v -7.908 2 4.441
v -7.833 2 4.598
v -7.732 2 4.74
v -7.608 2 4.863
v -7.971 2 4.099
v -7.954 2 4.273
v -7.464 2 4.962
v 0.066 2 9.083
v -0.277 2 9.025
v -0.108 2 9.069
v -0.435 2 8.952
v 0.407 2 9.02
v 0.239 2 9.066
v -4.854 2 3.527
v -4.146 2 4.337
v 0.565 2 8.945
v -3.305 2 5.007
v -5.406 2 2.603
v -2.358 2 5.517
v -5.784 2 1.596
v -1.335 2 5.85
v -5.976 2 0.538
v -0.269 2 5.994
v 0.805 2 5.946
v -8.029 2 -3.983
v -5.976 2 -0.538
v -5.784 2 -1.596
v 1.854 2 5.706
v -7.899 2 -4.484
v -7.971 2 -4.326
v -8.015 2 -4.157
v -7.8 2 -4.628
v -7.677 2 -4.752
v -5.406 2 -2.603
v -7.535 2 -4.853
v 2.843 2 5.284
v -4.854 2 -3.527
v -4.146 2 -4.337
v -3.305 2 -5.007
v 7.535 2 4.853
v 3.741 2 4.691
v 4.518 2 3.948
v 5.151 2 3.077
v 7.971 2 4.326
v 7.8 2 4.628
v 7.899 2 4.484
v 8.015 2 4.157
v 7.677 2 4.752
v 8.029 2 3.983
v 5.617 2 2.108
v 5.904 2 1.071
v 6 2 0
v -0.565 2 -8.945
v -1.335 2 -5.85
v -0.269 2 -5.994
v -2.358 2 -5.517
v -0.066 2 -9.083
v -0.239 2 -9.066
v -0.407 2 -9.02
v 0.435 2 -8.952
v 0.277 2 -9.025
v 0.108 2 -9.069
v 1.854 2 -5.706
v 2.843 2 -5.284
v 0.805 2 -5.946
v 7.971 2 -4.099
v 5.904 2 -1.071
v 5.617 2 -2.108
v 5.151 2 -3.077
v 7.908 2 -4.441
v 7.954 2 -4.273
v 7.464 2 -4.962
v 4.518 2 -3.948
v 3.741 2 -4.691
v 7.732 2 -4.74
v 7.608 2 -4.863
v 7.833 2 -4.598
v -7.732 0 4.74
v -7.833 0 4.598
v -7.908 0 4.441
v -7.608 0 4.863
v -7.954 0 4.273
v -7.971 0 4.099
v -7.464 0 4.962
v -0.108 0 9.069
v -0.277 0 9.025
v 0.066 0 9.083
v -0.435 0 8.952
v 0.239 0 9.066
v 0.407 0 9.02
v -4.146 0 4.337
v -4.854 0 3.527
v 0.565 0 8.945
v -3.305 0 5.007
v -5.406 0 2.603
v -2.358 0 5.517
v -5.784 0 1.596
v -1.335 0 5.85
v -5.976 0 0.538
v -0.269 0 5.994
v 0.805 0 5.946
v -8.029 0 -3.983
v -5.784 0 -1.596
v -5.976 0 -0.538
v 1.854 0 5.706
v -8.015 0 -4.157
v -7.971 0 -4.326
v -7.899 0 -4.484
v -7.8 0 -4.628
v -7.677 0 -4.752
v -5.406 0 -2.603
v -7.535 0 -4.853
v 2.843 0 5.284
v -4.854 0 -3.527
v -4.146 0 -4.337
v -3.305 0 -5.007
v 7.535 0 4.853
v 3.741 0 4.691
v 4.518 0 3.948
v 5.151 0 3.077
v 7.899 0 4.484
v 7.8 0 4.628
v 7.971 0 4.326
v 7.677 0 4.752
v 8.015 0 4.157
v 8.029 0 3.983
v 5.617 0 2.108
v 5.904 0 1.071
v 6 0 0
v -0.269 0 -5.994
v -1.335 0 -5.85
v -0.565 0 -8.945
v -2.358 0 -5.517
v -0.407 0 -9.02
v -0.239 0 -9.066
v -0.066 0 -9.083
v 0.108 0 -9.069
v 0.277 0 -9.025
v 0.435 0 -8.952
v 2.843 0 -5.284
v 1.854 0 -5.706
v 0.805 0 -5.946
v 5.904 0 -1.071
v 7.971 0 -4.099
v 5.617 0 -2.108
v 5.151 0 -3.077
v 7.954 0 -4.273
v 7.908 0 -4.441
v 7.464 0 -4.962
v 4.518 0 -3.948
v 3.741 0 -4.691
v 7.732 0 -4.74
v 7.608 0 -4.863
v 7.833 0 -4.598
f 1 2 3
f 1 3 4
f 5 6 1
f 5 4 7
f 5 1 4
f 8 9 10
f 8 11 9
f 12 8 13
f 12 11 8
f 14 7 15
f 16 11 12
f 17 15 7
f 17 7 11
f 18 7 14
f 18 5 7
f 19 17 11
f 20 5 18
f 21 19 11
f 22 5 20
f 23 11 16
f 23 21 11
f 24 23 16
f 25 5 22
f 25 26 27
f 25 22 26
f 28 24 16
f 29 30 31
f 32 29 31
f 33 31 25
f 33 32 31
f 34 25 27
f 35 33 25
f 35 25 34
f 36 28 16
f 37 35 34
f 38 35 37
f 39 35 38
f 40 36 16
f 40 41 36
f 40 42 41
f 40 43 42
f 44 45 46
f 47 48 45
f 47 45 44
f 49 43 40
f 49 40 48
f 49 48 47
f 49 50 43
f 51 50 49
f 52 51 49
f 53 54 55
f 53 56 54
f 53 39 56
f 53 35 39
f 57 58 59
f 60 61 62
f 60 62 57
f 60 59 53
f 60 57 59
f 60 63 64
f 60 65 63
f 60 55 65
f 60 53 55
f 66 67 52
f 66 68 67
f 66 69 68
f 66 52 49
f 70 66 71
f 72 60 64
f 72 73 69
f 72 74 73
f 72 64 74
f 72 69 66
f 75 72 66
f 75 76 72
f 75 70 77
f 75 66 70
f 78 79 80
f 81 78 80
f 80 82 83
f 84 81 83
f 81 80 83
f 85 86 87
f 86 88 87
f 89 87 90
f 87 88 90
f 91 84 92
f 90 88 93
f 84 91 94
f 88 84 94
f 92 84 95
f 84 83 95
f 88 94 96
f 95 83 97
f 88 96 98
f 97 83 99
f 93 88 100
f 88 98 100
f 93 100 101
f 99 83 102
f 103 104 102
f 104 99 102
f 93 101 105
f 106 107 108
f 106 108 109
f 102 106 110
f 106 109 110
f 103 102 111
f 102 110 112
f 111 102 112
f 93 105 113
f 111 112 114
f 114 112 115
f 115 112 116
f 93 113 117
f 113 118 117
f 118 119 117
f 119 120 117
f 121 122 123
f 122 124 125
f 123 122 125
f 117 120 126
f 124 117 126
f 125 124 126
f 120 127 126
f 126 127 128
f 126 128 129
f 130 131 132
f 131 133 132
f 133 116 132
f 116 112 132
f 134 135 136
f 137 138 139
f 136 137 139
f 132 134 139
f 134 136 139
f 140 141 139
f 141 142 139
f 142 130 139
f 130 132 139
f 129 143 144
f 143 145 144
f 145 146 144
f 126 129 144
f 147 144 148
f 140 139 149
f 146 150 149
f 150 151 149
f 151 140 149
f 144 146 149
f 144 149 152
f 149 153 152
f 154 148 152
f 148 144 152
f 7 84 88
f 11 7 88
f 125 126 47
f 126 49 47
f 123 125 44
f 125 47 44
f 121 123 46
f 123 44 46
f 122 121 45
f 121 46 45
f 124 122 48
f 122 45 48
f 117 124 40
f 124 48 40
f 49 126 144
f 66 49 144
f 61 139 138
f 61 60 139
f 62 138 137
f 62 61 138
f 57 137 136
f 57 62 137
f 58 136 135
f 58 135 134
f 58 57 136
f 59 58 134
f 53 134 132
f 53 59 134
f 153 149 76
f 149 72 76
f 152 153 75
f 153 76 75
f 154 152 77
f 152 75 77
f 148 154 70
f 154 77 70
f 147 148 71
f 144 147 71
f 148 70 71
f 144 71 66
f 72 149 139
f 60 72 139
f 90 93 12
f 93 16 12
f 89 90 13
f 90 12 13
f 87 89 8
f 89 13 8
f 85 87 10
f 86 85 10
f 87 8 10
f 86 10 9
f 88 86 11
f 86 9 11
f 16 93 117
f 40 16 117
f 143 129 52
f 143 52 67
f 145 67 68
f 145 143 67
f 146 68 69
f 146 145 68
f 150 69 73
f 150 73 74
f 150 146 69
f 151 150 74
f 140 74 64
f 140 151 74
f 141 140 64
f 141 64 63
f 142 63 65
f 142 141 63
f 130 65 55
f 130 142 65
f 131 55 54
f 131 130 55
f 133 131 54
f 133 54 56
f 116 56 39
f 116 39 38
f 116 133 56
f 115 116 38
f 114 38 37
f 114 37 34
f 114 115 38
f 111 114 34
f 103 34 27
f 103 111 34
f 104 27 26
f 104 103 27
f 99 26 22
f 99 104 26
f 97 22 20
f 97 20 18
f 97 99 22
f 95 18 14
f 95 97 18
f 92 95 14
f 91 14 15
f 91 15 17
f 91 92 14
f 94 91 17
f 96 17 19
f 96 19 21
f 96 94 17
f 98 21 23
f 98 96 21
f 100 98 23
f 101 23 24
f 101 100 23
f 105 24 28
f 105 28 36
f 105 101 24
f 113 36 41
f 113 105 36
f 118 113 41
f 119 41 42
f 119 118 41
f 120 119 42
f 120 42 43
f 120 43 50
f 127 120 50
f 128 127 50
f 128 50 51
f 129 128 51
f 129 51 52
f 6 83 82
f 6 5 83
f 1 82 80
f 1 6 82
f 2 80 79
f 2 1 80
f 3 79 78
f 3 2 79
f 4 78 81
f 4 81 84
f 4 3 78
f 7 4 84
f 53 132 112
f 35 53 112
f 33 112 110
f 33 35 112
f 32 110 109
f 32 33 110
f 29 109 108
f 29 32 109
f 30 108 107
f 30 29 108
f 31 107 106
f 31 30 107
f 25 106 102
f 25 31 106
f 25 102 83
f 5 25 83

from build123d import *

# Parameters (mm, degrees)
SKETCH1_R           = 6
BOSS_EXTRUDE1_DEPTH = 2
FILLET1_R           = 1


with BuildPart() as part:
    # Sketch1 → Boss-Extrude1 (new body)
    with BuildSketch(Plane(origin=(0, 0, 0), x_dir=(1, 0, 0), z_dir=(0, 1, 0))):
        Polygon((7.966349656, 4.676602025), (-0.066881329, 9.23736219), (-8.033230985, 4.560760165), (-7.966349656, -4.676602025), (0.066881329, -9.23736219), (8.033230985, -4.560760165), align=None)
        Circle(SKETCH1_R, mode=Mode.SUBTRACT)
    extrude(amount=BOSS_EXTRUDE1_DEPTH)

    # Fillet1
    fillet1_edges = [part.edges().sort_by_distance(p)[0] for p in [
        (8.033230985, 1, 4.560760165),
        (0.066881329, 1, 9.23736219),
        (-7.966349656, 1, 4.676602025),
        (-8.033230985, 1, -4.560760165),
        (-0.066881329, 1, -9.23736219),
        (7.966349656, 1, -4.676602025),
    ]]
    fillet(fillet1_edges, radius=FILLET1_R)


solid = part.part
